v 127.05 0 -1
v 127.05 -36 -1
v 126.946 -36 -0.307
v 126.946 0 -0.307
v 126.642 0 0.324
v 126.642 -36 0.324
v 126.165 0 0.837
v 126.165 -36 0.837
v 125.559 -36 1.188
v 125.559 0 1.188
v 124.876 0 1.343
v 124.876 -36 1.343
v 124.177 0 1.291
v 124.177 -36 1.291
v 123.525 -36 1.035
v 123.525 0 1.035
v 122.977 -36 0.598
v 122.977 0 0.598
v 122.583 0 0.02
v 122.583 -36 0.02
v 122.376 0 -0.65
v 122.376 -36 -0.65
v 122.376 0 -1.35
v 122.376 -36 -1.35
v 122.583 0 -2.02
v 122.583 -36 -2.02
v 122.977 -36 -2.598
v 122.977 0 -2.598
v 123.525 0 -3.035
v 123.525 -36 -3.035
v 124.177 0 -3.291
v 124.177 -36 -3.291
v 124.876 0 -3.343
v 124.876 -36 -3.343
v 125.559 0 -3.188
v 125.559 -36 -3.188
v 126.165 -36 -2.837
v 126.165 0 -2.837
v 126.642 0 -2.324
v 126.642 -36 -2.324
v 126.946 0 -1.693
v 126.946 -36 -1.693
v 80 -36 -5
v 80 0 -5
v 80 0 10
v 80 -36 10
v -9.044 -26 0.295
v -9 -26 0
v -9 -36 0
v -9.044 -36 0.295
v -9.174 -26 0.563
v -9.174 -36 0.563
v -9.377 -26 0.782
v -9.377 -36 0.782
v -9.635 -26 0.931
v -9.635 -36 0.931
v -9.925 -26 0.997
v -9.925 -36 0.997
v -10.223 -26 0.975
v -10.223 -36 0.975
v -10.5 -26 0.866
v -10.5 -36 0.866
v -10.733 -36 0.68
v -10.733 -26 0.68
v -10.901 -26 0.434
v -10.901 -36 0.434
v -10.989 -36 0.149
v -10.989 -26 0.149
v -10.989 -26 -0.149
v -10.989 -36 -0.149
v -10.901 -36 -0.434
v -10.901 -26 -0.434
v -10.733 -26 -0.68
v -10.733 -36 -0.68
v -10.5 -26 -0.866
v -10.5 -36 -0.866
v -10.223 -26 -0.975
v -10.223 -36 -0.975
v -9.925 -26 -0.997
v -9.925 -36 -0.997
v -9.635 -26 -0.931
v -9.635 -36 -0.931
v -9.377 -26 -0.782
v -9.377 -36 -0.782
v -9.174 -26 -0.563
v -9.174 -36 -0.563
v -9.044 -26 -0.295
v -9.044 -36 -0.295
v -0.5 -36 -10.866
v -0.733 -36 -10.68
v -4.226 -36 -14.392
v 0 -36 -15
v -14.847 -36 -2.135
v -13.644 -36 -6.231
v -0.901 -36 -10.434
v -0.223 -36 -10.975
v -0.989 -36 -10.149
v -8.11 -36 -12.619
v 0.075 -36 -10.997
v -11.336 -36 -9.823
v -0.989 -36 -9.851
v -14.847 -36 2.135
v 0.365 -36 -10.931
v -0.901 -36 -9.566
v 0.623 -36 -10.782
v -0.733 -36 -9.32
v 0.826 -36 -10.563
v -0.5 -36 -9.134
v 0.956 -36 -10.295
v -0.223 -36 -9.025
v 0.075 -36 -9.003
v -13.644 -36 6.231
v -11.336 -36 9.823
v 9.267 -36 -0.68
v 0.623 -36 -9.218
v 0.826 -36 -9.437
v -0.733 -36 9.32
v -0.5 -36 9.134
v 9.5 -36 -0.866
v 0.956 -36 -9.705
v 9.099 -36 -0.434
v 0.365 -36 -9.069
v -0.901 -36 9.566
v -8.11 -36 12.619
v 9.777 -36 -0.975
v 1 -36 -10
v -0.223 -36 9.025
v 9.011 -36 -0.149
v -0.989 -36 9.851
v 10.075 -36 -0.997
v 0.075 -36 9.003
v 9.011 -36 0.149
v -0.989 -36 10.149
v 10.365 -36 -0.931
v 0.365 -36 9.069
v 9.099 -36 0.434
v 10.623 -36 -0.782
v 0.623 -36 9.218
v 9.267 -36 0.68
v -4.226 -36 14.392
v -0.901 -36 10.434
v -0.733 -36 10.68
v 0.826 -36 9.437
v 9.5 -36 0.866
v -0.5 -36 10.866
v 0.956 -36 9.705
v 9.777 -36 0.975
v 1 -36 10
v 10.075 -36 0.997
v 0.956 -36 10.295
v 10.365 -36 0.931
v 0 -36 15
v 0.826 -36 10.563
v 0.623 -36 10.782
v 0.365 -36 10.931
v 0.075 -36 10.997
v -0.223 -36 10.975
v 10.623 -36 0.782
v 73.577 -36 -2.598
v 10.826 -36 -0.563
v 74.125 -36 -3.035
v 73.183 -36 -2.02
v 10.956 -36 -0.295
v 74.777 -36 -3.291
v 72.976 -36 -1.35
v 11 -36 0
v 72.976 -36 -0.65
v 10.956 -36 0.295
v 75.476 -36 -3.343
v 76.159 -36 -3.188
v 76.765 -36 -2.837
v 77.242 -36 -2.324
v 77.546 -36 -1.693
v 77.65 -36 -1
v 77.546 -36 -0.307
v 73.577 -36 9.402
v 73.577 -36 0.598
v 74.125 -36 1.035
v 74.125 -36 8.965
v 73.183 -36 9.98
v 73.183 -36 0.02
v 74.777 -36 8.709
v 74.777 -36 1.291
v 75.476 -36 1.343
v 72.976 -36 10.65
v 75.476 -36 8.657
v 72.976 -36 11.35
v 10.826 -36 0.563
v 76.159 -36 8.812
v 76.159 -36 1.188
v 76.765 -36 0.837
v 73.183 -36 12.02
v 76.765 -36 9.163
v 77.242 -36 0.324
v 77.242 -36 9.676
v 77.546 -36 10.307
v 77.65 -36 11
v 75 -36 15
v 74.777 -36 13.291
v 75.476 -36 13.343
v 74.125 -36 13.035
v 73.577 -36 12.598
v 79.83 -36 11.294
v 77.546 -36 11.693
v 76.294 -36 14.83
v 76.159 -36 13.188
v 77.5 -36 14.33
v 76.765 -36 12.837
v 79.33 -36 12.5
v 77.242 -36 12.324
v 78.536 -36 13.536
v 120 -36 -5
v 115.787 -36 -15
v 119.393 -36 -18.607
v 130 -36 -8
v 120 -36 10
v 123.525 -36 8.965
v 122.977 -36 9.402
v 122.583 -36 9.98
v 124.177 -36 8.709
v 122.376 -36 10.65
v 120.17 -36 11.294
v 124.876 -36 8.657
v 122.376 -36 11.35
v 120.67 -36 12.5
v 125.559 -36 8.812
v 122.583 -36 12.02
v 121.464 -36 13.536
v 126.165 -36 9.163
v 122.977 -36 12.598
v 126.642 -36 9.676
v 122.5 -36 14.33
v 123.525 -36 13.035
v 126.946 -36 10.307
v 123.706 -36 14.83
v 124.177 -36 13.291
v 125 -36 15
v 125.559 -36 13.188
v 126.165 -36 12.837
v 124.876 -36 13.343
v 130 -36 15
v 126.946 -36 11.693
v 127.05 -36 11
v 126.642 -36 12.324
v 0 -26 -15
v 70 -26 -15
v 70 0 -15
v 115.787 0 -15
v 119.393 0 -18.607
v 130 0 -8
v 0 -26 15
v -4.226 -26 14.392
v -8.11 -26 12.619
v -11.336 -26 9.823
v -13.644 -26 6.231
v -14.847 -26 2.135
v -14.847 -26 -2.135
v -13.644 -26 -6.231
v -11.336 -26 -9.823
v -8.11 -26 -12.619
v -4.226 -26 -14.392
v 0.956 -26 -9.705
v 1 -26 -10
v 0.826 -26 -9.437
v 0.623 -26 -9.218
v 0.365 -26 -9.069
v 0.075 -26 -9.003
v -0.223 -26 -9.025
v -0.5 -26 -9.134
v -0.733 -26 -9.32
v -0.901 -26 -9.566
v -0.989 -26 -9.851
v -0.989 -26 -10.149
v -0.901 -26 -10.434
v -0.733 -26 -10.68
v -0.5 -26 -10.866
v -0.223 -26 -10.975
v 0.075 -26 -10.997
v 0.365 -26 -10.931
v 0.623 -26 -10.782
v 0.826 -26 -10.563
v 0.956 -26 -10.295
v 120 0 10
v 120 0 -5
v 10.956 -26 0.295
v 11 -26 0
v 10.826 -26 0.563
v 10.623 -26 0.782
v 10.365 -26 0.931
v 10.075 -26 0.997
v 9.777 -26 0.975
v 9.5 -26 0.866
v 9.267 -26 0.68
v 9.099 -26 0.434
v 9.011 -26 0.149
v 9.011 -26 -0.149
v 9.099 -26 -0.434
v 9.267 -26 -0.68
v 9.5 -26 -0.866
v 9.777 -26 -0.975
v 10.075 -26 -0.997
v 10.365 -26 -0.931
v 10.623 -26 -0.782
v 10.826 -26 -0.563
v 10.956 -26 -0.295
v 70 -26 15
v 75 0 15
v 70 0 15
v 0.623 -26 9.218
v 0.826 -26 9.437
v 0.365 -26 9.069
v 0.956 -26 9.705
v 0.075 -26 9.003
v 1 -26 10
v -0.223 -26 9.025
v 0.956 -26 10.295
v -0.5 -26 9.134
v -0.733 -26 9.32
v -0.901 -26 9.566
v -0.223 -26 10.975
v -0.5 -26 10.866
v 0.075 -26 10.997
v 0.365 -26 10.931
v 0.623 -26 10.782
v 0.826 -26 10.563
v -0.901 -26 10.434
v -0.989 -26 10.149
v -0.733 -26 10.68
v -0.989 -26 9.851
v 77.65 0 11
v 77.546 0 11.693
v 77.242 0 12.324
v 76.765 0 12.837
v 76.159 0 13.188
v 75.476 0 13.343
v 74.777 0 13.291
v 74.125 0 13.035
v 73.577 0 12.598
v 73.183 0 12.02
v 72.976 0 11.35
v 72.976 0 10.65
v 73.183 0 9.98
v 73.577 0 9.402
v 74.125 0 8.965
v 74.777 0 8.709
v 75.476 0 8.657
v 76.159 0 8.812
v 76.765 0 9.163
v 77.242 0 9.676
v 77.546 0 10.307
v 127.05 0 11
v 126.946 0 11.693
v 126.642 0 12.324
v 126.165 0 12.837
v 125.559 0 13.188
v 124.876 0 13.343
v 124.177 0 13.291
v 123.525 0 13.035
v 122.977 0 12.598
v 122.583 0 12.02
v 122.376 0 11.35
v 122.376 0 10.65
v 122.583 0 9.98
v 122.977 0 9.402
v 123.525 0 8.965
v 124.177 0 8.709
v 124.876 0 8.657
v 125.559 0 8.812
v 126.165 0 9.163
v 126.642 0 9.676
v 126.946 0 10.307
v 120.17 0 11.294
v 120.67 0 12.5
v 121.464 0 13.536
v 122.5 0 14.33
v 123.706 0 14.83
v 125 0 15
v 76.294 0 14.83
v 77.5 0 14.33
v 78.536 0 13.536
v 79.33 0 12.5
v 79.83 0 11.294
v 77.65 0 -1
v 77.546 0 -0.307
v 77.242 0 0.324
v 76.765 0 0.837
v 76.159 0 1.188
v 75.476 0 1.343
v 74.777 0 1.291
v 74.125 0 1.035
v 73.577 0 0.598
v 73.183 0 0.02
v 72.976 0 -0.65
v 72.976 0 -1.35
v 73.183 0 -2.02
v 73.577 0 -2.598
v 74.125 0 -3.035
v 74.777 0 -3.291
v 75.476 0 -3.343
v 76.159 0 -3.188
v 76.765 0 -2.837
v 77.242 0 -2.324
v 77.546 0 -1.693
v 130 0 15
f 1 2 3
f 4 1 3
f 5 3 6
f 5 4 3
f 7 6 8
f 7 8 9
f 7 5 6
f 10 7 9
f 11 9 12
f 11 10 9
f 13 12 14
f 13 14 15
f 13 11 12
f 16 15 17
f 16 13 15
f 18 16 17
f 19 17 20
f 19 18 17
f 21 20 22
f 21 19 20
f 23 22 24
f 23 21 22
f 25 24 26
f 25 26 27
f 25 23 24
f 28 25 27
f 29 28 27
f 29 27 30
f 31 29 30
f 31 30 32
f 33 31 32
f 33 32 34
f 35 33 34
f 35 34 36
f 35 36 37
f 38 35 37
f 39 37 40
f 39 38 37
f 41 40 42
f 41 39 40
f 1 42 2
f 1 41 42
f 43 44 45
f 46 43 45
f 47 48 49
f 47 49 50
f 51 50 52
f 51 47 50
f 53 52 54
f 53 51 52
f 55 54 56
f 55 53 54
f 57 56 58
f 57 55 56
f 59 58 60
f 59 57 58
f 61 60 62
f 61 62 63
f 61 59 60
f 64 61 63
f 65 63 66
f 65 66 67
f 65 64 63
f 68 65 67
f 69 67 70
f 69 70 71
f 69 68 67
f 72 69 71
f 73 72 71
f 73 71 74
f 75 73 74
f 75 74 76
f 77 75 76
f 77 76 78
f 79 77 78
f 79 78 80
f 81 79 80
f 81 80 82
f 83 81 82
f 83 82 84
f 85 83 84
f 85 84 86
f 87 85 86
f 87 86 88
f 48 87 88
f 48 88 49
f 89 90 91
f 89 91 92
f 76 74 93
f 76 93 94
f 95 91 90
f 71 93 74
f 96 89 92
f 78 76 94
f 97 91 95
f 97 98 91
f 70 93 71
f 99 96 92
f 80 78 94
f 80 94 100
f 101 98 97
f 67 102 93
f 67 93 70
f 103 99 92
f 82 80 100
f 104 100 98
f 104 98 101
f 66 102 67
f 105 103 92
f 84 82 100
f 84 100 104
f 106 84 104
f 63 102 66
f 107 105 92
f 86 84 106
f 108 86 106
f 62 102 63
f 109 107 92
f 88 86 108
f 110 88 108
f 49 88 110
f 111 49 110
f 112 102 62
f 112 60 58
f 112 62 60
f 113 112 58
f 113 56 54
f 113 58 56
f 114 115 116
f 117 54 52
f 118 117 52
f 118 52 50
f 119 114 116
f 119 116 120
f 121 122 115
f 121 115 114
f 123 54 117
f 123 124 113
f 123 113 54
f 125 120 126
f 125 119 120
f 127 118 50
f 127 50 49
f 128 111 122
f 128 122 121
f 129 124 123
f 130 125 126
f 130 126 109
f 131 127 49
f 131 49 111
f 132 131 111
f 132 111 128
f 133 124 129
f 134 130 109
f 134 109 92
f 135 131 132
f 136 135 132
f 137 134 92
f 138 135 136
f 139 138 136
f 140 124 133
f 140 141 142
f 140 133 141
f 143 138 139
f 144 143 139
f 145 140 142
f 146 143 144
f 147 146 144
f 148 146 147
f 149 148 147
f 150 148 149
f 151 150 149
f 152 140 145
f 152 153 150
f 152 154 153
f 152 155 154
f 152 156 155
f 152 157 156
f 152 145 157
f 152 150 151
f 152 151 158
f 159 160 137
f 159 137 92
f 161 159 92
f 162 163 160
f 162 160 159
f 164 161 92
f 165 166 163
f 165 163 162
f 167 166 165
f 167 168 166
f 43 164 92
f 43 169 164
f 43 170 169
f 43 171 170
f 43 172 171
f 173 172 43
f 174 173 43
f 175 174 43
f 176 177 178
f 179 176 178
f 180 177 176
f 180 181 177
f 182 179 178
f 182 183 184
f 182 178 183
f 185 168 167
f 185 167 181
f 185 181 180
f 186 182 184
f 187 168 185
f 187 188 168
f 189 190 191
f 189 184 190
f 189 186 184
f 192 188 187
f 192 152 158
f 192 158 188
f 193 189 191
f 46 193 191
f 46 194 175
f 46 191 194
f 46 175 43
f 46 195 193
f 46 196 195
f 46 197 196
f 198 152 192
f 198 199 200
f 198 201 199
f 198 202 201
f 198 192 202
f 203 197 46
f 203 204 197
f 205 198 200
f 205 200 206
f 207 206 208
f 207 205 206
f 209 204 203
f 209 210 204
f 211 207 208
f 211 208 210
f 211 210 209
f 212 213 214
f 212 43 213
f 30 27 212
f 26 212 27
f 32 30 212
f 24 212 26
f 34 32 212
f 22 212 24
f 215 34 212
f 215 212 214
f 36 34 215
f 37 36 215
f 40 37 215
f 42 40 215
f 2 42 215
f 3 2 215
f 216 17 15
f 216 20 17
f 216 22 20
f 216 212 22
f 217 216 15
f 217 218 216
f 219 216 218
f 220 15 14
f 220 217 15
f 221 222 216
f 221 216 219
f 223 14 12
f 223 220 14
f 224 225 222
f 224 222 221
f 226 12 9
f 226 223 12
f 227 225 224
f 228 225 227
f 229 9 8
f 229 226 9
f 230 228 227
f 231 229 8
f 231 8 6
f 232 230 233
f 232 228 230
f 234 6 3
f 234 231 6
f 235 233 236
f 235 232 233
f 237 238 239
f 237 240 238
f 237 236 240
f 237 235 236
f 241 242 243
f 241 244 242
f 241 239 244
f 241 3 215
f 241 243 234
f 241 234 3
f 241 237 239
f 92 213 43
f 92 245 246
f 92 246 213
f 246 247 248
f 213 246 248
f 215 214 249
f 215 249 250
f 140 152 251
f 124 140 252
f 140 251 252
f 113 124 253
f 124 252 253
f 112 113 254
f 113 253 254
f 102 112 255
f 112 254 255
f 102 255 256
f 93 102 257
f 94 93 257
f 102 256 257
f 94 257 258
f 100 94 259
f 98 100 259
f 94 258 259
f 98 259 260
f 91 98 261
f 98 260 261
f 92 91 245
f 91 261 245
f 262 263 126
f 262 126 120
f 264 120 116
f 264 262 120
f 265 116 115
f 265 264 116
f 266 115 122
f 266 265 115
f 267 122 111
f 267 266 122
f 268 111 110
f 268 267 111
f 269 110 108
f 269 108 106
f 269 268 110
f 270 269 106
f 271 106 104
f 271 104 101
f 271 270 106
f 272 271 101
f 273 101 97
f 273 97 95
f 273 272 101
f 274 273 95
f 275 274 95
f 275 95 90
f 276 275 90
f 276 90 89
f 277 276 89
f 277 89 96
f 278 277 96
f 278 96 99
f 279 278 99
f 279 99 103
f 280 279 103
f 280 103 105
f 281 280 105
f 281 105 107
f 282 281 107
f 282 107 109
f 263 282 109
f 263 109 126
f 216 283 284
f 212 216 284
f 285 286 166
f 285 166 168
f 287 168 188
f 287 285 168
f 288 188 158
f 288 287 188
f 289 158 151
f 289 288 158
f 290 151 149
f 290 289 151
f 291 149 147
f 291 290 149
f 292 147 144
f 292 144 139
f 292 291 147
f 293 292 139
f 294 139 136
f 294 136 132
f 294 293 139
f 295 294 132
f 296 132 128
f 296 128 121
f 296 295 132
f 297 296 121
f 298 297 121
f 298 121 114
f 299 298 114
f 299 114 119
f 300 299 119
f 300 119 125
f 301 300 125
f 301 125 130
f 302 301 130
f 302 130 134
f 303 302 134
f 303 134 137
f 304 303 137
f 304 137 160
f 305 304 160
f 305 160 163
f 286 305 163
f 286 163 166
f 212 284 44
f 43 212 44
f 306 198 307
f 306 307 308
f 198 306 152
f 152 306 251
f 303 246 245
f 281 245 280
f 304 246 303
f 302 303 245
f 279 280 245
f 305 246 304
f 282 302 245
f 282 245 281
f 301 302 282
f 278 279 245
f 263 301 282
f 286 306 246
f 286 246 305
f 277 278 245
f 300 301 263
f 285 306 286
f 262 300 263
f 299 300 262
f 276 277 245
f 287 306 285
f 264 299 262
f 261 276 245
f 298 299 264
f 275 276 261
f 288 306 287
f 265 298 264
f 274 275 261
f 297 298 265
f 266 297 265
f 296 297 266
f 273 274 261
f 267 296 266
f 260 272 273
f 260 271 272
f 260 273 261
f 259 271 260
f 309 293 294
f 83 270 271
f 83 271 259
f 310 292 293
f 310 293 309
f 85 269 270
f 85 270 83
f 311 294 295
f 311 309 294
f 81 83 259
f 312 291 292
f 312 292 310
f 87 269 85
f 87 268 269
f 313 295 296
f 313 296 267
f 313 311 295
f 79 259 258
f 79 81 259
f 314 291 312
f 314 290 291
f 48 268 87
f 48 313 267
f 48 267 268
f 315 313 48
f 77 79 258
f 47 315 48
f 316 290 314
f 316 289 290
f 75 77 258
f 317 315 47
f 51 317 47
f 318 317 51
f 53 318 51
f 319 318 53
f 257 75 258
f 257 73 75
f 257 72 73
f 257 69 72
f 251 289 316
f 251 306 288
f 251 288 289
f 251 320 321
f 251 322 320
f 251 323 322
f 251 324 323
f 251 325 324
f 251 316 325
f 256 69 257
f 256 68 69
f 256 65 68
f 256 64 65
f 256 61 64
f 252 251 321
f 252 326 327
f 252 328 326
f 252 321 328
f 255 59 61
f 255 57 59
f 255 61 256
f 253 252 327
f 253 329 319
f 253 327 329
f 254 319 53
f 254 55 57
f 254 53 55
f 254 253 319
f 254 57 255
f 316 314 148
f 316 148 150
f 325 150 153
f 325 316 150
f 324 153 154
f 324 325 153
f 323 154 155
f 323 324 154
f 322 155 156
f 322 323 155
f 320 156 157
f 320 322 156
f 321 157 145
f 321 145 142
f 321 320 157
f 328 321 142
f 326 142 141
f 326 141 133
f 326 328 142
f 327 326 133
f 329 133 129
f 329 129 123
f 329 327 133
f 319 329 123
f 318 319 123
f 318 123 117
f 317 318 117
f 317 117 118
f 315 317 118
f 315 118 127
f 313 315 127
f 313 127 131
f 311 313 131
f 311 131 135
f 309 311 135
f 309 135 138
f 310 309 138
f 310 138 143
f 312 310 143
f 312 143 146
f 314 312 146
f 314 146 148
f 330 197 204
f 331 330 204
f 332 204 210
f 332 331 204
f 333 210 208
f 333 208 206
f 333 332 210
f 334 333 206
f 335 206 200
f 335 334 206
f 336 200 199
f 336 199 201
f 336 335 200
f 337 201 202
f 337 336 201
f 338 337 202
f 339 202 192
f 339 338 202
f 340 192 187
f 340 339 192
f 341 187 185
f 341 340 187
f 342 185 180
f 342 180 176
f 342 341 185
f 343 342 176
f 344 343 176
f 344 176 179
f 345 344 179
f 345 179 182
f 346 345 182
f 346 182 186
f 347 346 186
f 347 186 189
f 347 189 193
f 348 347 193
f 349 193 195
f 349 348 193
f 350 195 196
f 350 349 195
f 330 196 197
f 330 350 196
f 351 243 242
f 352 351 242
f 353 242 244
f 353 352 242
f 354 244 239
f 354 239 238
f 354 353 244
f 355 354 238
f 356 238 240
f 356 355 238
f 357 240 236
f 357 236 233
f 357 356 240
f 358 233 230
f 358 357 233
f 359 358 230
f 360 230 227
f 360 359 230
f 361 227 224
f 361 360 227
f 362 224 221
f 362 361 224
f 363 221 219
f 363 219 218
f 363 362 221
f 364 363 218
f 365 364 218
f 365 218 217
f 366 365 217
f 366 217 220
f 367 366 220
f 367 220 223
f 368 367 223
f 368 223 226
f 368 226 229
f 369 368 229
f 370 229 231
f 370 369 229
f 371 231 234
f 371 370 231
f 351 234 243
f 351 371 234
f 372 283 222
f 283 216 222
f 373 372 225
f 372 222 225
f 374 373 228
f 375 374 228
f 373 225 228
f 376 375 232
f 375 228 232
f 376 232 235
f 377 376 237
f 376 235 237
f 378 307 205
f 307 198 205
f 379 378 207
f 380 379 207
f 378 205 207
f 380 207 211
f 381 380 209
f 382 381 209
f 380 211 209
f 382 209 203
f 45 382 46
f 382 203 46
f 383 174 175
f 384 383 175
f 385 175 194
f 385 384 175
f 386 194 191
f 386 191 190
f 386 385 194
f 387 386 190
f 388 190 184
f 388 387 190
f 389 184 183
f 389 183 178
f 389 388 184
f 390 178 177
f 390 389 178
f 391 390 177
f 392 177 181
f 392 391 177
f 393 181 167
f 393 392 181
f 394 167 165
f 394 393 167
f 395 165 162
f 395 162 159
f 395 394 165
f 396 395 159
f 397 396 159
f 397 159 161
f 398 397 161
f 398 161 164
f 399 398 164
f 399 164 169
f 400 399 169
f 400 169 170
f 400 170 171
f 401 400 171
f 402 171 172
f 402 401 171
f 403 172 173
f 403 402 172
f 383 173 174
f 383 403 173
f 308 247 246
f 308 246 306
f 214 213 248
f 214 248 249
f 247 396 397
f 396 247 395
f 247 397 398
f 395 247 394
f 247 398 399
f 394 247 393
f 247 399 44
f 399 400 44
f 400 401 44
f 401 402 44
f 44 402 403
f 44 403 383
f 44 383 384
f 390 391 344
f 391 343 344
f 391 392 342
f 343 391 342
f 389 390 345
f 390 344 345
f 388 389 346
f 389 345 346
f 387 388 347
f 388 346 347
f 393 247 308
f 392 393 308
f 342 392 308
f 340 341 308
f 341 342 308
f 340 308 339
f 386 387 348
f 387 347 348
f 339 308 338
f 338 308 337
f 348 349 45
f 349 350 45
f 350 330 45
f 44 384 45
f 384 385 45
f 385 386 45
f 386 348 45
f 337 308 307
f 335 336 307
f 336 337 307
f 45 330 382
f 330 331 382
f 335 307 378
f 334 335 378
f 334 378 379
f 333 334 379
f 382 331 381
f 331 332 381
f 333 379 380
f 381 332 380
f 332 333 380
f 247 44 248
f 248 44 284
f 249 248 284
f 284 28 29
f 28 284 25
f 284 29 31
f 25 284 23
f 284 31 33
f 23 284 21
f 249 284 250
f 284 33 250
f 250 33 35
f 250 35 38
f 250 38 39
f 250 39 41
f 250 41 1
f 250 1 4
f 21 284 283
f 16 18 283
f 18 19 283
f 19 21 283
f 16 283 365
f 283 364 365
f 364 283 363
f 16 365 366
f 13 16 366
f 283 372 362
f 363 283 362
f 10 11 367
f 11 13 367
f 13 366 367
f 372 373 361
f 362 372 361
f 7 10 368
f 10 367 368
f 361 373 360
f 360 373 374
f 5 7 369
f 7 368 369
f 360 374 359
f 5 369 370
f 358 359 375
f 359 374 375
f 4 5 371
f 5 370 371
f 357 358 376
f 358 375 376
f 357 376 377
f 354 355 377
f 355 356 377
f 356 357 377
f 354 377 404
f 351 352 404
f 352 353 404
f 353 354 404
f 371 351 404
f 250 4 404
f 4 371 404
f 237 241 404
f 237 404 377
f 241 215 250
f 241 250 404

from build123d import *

# Parameters (mm, degrees)
F0_R     = 1
F0_R_2   = 2.35
F1_DEPTH = 36
F2_W     = 98.13832
F2_H     = 30
F3_DEPTH = 26
F4_R     = 5
F5_SIZE  = 7
F7_DEPTH = 36


with BuildPart() as f1:
    # F0 (on Front) → F1 (new body)
    with BuildSketch(Plane.XZ):
        with BuildLine():
            Line((80, 15), (0, 15))
            ThreePointArc((0, 15), (-15, 0), (0, -15))
            Line((0, -15), (130, -15))
            Line((130, -15), (130, 15))
            Line((130, 15), (120, 15))
            Line((120, 15), (120, -5))
            Line((120, -5), (80, -5))
            Line((80, -5), (80, 15))
        make_face()
        with Locations((0, -10)):
            Circle(F0_R, mode=Mode.SUBTRACT)
        with Locations((75.3, -1)):
            Circle(F0_R_2, mode=Mode.SUBTRACT)
        with Locations((124.7, -1)):
            Circle(F0_R_2, mode=Mode.SUBTRACT)
        with Locations((-10, 0)):
            Circle(F0_R, mode=Mode.SUBTRACT)
        with Locations((10, 0)):
            Circle(F0_R, mode=Mode.SUBTRACT)
        with Locations((0, 10)):
            Circle(F0_R, mode=Mode.SUBTRACT)
        with Locations((75.3, 11)):
            Circle(F0_R_2, mode=Mode.SUBTRACT)
        with Locations((124.7, 11)):
            Circle(F0_R_2, mode=Mode.SUBTRACT)
    extrude(amount=F1_DEPTH)

    # F2 (on face) → F3 (cut)
    with BuildSketch(Plane(origin=(0, 0, 0), x_dir=(-1, 0, 0), z_dir=(0, 1, 0))):
        with Locations((-20.93084, 0)):
            Rectangle(F2_W, F2_H)
    extrude(amount=-F3_DEPTH, mode=Mode.SUBTRACT)

    # F4
    f4_edges = [f1.edges().sort_by_distance(p)[0] for p in [
        (80, -18, 15),
        (120, -18, 15),
    ]]
    fillet(f4_edges, radius=F4_R)

    # F5
    f5_edges = [f1.edges().sort_by_distance(p)[0] for p in [
        (130, -18, -15),
    ]]
    chamfer(f5_edges, length=F5_SIZE)

    # F6 (on face) → F7 (join)
    with BuildSketch(Plane.XZ.offset(36)):
        Polygon((119.393398, -18.606602), (123, -15), (115.786797, -15), align=None)
    extrude(amount=-F7_DEPTH)


solid = f1.part
